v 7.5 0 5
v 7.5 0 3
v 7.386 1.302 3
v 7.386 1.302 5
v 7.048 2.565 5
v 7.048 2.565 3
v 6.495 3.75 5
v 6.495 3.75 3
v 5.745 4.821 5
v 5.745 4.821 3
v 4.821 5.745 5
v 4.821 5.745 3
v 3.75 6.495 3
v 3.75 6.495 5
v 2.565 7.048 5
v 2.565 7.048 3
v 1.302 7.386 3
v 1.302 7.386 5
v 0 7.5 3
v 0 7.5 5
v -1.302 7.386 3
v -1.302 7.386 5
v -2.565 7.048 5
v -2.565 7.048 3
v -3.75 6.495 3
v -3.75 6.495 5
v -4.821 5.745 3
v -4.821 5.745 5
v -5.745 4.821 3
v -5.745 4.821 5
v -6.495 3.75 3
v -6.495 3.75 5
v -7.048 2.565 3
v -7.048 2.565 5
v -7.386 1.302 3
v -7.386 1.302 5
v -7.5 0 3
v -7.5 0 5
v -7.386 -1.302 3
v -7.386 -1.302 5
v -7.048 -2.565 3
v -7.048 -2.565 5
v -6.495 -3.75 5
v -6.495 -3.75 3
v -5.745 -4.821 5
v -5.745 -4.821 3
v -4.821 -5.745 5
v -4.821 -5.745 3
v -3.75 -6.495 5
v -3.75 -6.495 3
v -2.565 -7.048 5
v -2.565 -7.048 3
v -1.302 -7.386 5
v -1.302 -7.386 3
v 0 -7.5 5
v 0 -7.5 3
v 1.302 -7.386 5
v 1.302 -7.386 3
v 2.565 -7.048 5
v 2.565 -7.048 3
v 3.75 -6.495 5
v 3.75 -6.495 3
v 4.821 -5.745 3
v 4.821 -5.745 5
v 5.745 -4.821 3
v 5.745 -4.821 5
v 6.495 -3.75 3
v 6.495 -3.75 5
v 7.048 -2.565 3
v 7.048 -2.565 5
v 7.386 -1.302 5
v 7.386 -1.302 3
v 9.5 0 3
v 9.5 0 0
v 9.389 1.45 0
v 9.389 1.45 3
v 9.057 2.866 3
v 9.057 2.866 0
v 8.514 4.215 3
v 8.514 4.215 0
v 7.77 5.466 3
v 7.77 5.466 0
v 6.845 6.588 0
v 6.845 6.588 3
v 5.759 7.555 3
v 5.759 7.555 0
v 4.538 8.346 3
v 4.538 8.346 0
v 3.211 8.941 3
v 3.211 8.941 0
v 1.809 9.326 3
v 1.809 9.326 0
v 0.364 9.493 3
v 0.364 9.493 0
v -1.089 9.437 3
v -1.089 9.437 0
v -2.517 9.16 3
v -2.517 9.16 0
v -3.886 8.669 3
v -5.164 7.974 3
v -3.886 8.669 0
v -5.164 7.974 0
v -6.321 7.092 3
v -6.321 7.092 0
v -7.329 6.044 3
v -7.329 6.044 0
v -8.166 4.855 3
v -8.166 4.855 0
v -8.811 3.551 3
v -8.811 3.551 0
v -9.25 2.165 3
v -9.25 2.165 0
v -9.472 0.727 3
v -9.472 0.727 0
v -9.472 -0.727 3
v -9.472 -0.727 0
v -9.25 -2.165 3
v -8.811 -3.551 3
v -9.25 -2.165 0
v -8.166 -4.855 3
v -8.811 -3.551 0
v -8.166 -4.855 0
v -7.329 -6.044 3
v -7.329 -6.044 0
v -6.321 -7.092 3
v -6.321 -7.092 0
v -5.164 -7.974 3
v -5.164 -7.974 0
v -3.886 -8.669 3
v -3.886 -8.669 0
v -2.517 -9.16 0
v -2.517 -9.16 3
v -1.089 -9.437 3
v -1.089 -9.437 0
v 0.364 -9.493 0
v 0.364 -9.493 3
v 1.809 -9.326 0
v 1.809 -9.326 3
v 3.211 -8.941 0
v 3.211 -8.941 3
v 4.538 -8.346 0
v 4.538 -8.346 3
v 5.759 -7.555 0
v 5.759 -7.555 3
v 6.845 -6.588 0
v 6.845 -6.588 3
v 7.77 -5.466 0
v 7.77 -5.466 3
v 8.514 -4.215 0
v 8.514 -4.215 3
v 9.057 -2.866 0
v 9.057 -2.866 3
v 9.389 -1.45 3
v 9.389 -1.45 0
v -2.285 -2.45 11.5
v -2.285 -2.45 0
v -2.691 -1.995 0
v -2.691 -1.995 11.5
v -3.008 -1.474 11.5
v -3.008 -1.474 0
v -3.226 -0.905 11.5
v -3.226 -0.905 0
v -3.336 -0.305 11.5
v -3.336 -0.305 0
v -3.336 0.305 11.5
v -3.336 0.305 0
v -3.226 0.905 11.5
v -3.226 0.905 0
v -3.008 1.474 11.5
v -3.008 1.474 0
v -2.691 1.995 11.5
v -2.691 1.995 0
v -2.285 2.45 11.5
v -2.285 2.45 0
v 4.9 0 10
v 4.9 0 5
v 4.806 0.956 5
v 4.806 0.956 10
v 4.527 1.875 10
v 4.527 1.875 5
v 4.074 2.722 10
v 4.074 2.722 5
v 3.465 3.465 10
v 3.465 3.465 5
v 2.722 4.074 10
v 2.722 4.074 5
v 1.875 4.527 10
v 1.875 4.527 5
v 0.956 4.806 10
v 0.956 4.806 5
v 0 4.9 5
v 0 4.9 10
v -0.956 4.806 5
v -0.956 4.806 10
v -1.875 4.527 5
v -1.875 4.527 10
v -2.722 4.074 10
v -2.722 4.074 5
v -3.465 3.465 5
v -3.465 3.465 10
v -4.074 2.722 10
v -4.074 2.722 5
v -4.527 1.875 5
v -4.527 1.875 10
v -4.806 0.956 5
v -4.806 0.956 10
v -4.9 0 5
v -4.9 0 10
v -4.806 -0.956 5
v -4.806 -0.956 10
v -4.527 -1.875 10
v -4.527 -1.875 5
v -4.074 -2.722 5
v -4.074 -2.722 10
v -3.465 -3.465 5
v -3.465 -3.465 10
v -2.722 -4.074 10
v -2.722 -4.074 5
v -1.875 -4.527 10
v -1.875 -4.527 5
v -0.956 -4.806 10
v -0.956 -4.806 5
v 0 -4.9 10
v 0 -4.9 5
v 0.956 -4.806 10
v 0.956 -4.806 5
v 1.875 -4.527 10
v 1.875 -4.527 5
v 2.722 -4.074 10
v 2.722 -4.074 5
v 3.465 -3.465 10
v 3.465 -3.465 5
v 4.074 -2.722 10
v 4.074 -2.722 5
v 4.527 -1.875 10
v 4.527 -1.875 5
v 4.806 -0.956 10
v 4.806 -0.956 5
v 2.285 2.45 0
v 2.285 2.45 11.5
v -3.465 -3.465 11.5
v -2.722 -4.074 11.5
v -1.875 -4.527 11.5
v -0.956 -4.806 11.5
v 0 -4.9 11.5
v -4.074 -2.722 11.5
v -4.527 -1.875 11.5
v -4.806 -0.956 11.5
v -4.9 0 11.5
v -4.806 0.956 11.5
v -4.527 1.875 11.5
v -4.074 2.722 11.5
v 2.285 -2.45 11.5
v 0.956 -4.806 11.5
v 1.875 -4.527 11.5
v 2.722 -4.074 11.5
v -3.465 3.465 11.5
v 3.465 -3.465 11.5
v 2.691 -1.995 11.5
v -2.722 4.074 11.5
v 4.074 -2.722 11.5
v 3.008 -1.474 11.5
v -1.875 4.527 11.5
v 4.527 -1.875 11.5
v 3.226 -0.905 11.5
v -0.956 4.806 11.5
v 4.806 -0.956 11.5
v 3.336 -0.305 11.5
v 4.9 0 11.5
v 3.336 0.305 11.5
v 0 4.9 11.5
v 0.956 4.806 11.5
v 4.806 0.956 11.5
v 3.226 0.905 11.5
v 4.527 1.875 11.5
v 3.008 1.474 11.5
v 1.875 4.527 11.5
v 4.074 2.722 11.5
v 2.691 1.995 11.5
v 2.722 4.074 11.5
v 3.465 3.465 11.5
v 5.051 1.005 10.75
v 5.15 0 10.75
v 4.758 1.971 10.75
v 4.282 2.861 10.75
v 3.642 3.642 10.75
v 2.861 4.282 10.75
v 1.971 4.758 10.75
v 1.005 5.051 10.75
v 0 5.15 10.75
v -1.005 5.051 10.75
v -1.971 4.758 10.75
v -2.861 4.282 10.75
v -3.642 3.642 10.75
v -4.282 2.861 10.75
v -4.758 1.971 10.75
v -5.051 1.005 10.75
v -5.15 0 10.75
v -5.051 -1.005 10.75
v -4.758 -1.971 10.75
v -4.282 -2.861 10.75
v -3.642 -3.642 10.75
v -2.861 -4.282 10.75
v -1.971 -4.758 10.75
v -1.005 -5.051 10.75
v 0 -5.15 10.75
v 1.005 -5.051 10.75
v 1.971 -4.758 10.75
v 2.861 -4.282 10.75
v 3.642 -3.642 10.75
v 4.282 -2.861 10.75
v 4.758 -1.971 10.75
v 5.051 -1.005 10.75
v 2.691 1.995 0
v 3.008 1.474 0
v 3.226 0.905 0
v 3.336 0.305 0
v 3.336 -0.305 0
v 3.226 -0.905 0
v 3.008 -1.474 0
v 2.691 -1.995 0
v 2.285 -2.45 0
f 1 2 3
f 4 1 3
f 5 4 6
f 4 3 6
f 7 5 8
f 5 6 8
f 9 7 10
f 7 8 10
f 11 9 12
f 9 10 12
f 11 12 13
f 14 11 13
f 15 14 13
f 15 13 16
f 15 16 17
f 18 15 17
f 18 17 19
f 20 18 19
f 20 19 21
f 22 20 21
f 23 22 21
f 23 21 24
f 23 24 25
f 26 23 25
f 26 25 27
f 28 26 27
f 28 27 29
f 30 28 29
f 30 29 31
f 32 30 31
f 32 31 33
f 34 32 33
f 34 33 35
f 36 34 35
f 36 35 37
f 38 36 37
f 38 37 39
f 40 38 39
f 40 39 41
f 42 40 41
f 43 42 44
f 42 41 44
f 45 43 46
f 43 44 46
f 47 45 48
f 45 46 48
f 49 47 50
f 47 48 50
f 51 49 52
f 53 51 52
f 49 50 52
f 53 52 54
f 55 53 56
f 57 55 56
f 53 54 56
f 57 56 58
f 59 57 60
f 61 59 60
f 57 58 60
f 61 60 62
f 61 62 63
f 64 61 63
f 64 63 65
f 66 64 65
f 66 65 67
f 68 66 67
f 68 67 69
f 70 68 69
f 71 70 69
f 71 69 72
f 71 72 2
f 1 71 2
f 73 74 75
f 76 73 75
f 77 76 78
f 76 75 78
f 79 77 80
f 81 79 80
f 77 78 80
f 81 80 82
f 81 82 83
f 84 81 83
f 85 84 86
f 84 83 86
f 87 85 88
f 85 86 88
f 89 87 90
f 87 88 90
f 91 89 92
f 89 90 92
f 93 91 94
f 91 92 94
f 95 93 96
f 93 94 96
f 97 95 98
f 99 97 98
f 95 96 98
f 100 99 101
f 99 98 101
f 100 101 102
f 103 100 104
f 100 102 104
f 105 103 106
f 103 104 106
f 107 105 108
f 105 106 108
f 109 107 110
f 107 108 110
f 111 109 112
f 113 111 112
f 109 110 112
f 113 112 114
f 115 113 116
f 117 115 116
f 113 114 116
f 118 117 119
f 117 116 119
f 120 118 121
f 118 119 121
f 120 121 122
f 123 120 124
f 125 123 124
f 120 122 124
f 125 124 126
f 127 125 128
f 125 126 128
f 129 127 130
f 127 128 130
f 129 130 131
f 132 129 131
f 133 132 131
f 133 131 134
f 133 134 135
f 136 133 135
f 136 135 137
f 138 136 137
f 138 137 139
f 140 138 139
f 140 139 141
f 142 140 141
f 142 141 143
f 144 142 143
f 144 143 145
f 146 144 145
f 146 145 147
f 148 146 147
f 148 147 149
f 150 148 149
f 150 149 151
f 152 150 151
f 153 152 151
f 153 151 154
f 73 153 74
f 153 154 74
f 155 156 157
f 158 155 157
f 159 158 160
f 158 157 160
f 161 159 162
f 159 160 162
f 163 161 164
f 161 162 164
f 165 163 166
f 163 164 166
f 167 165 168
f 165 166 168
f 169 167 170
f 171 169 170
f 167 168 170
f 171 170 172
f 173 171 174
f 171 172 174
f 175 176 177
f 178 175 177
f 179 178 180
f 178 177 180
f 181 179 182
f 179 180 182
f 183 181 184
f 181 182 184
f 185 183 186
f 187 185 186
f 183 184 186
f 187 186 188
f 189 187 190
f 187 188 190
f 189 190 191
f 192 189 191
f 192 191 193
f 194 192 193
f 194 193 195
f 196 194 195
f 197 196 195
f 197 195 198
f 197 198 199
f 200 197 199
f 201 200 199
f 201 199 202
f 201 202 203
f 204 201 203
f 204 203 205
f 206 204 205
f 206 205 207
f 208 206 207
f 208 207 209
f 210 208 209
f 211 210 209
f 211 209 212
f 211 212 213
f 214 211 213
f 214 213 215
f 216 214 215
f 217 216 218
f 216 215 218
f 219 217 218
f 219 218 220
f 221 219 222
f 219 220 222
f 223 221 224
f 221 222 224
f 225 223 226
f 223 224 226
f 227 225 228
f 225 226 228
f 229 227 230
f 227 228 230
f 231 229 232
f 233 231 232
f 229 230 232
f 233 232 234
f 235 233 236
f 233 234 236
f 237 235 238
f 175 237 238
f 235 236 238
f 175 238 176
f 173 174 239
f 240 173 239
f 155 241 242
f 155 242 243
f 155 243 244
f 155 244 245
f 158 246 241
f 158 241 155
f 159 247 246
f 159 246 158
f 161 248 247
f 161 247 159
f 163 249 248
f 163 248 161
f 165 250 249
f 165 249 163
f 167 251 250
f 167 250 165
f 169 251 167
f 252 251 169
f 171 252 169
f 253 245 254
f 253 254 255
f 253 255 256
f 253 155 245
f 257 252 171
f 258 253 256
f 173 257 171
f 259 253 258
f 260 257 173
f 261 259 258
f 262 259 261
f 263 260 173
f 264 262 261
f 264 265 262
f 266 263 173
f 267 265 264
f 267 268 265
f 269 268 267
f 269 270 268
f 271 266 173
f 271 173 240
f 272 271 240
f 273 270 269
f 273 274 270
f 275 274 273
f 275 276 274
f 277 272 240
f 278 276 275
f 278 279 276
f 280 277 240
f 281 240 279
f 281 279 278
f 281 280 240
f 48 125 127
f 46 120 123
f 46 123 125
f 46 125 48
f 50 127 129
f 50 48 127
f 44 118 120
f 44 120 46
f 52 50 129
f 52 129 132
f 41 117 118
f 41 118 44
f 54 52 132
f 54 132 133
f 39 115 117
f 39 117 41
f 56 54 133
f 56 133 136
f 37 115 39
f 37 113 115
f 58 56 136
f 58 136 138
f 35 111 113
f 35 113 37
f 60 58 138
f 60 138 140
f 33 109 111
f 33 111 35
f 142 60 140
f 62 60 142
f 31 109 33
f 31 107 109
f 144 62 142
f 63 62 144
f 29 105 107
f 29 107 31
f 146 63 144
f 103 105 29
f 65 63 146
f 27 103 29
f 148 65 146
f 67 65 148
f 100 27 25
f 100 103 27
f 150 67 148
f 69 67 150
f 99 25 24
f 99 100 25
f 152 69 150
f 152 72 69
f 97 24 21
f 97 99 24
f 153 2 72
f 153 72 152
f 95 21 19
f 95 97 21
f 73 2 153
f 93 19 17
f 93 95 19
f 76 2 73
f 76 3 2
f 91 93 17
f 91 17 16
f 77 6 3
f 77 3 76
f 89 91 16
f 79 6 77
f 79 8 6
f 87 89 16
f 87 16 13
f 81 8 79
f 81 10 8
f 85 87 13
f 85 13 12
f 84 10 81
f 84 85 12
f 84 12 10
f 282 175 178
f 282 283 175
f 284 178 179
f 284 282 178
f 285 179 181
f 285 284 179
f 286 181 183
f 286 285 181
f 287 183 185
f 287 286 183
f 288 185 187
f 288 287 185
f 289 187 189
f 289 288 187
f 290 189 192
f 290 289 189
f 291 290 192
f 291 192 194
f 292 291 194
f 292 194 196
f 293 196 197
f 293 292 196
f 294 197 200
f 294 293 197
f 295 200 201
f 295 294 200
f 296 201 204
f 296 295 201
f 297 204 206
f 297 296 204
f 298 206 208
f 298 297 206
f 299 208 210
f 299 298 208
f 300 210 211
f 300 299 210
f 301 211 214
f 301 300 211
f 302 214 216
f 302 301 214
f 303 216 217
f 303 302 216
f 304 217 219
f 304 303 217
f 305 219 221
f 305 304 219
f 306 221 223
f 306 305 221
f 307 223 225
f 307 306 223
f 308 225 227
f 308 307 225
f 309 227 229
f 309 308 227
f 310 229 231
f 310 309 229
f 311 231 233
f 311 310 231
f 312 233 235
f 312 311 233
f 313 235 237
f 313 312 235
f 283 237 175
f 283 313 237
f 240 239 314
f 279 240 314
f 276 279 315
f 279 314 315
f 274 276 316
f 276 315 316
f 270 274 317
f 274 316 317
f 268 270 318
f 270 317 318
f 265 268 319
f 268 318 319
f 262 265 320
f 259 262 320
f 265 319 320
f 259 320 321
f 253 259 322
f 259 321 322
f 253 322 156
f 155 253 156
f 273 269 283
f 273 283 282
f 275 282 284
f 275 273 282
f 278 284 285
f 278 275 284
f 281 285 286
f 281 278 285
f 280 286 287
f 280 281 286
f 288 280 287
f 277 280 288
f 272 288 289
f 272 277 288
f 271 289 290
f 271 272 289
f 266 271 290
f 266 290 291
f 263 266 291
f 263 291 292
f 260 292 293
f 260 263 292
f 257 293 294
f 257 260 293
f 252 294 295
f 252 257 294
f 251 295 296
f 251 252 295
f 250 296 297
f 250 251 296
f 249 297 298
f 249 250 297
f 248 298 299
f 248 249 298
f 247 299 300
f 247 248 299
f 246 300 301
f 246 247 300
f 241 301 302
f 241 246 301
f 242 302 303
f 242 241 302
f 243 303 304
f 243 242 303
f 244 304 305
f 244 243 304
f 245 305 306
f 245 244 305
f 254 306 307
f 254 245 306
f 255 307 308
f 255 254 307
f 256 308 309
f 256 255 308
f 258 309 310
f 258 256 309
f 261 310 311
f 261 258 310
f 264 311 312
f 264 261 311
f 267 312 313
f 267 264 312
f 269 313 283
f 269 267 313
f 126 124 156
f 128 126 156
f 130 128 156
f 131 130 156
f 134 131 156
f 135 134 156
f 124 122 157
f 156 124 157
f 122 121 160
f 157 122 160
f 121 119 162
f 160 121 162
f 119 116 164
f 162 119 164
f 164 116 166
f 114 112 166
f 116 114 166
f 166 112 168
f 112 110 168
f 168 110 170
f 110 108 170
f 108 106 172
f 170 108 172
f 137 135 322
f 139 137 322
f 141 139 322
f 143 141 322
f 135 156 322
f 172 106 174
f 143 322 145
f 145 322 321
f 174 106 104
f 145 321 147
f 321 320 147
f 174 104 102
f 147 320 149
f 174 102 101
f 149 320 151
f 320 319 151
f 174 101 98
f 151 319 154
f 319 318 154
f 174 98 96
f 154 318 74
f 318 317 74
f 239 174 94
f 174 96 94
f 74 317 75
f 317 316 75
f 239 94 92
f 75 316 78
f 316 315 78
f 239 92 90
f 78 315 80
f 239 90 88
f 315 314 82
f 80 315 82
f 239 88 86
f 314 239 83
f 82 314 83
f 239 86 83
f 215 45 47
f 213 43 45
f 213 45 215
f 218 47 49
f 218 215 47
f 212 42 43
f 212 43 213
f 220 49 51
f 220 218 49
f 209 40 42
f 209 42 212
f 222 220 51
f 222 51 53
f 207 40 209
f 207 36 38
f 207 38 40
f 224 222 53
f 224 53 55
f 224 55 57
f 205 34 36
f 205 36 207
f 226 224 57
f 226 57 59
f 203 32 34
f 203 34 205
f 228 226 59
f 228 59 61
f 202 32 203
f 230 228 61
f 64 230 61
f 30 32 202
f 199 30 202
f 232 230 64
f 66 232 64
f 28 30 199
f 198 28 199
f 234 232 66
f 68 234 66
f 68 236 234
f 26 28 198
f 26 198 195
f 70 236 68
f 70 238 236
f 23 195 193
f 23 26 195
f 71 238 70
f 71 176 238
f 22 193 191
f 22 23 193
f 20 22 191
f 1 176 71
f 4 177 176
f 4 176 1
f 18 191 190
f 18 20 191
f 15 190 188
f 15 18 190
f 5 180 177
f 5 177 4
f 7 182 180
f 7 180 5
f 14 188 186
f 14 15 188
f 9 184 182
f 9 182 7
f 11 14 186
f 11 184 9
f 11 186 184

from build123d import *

# Parameters (mm, degrees)
F0_R     = 9.5
F0_R_2   = 7.5
F1_DEPTH = 3
F0_R_3   = 4.9
F2_DEPTH = 5
F3_DEPTH = 11.5


with BuildPart() as f1:
    # F0 (on Top) → F1 (new body)
    with BuildSketch(Plane.XY):
        Circle(F0_R)
        Circle(F0_R_2, mode=Mode.SUBTRACT)
    extrude(amount=F1_DEPTH)

    # F0 (on Top) → F2 (join)
    with BuildSketch(Plane.XY):
        Circle(F0_R_2)
        Circle(F0_R_3, mode=Mode.SUBTRACT)
    extrude(amount=F2_DEPTH)

    # F0 (on Top) → F3 (join)
    with BuildSketch(Plane.XY):
        Circle(F0_R_3)
        with BuildLine():
            ThreePointArc((-2.2847319318, -2.45), (-3.35, 0), (-2.2847319318, 2.45))
            Line((-2.2847319318, 2.45), (2.2847319318, 2.45))
            ThreePointArc((2.2847319318, 2.45), (3.35, 0), (2.2847319318, -2.45))
            Line((2.2847319318, -2.45), (-2.2847319318, -2.45))
        make_face(mode=Mode.SUBTRACT)
    extrude(amount=F3_DEPTH)

    # F4 (on Front) → F5 (revolve)
    with BuildSketch(Plane.XZ):
        Polygon((5.15, 10.75), (4.9, 11.5), (4.9, 10), align=None)
    revolve(axis=Axis((0, 0, 8.9765712619), (0, 0, 1)))


solid = f1.part
